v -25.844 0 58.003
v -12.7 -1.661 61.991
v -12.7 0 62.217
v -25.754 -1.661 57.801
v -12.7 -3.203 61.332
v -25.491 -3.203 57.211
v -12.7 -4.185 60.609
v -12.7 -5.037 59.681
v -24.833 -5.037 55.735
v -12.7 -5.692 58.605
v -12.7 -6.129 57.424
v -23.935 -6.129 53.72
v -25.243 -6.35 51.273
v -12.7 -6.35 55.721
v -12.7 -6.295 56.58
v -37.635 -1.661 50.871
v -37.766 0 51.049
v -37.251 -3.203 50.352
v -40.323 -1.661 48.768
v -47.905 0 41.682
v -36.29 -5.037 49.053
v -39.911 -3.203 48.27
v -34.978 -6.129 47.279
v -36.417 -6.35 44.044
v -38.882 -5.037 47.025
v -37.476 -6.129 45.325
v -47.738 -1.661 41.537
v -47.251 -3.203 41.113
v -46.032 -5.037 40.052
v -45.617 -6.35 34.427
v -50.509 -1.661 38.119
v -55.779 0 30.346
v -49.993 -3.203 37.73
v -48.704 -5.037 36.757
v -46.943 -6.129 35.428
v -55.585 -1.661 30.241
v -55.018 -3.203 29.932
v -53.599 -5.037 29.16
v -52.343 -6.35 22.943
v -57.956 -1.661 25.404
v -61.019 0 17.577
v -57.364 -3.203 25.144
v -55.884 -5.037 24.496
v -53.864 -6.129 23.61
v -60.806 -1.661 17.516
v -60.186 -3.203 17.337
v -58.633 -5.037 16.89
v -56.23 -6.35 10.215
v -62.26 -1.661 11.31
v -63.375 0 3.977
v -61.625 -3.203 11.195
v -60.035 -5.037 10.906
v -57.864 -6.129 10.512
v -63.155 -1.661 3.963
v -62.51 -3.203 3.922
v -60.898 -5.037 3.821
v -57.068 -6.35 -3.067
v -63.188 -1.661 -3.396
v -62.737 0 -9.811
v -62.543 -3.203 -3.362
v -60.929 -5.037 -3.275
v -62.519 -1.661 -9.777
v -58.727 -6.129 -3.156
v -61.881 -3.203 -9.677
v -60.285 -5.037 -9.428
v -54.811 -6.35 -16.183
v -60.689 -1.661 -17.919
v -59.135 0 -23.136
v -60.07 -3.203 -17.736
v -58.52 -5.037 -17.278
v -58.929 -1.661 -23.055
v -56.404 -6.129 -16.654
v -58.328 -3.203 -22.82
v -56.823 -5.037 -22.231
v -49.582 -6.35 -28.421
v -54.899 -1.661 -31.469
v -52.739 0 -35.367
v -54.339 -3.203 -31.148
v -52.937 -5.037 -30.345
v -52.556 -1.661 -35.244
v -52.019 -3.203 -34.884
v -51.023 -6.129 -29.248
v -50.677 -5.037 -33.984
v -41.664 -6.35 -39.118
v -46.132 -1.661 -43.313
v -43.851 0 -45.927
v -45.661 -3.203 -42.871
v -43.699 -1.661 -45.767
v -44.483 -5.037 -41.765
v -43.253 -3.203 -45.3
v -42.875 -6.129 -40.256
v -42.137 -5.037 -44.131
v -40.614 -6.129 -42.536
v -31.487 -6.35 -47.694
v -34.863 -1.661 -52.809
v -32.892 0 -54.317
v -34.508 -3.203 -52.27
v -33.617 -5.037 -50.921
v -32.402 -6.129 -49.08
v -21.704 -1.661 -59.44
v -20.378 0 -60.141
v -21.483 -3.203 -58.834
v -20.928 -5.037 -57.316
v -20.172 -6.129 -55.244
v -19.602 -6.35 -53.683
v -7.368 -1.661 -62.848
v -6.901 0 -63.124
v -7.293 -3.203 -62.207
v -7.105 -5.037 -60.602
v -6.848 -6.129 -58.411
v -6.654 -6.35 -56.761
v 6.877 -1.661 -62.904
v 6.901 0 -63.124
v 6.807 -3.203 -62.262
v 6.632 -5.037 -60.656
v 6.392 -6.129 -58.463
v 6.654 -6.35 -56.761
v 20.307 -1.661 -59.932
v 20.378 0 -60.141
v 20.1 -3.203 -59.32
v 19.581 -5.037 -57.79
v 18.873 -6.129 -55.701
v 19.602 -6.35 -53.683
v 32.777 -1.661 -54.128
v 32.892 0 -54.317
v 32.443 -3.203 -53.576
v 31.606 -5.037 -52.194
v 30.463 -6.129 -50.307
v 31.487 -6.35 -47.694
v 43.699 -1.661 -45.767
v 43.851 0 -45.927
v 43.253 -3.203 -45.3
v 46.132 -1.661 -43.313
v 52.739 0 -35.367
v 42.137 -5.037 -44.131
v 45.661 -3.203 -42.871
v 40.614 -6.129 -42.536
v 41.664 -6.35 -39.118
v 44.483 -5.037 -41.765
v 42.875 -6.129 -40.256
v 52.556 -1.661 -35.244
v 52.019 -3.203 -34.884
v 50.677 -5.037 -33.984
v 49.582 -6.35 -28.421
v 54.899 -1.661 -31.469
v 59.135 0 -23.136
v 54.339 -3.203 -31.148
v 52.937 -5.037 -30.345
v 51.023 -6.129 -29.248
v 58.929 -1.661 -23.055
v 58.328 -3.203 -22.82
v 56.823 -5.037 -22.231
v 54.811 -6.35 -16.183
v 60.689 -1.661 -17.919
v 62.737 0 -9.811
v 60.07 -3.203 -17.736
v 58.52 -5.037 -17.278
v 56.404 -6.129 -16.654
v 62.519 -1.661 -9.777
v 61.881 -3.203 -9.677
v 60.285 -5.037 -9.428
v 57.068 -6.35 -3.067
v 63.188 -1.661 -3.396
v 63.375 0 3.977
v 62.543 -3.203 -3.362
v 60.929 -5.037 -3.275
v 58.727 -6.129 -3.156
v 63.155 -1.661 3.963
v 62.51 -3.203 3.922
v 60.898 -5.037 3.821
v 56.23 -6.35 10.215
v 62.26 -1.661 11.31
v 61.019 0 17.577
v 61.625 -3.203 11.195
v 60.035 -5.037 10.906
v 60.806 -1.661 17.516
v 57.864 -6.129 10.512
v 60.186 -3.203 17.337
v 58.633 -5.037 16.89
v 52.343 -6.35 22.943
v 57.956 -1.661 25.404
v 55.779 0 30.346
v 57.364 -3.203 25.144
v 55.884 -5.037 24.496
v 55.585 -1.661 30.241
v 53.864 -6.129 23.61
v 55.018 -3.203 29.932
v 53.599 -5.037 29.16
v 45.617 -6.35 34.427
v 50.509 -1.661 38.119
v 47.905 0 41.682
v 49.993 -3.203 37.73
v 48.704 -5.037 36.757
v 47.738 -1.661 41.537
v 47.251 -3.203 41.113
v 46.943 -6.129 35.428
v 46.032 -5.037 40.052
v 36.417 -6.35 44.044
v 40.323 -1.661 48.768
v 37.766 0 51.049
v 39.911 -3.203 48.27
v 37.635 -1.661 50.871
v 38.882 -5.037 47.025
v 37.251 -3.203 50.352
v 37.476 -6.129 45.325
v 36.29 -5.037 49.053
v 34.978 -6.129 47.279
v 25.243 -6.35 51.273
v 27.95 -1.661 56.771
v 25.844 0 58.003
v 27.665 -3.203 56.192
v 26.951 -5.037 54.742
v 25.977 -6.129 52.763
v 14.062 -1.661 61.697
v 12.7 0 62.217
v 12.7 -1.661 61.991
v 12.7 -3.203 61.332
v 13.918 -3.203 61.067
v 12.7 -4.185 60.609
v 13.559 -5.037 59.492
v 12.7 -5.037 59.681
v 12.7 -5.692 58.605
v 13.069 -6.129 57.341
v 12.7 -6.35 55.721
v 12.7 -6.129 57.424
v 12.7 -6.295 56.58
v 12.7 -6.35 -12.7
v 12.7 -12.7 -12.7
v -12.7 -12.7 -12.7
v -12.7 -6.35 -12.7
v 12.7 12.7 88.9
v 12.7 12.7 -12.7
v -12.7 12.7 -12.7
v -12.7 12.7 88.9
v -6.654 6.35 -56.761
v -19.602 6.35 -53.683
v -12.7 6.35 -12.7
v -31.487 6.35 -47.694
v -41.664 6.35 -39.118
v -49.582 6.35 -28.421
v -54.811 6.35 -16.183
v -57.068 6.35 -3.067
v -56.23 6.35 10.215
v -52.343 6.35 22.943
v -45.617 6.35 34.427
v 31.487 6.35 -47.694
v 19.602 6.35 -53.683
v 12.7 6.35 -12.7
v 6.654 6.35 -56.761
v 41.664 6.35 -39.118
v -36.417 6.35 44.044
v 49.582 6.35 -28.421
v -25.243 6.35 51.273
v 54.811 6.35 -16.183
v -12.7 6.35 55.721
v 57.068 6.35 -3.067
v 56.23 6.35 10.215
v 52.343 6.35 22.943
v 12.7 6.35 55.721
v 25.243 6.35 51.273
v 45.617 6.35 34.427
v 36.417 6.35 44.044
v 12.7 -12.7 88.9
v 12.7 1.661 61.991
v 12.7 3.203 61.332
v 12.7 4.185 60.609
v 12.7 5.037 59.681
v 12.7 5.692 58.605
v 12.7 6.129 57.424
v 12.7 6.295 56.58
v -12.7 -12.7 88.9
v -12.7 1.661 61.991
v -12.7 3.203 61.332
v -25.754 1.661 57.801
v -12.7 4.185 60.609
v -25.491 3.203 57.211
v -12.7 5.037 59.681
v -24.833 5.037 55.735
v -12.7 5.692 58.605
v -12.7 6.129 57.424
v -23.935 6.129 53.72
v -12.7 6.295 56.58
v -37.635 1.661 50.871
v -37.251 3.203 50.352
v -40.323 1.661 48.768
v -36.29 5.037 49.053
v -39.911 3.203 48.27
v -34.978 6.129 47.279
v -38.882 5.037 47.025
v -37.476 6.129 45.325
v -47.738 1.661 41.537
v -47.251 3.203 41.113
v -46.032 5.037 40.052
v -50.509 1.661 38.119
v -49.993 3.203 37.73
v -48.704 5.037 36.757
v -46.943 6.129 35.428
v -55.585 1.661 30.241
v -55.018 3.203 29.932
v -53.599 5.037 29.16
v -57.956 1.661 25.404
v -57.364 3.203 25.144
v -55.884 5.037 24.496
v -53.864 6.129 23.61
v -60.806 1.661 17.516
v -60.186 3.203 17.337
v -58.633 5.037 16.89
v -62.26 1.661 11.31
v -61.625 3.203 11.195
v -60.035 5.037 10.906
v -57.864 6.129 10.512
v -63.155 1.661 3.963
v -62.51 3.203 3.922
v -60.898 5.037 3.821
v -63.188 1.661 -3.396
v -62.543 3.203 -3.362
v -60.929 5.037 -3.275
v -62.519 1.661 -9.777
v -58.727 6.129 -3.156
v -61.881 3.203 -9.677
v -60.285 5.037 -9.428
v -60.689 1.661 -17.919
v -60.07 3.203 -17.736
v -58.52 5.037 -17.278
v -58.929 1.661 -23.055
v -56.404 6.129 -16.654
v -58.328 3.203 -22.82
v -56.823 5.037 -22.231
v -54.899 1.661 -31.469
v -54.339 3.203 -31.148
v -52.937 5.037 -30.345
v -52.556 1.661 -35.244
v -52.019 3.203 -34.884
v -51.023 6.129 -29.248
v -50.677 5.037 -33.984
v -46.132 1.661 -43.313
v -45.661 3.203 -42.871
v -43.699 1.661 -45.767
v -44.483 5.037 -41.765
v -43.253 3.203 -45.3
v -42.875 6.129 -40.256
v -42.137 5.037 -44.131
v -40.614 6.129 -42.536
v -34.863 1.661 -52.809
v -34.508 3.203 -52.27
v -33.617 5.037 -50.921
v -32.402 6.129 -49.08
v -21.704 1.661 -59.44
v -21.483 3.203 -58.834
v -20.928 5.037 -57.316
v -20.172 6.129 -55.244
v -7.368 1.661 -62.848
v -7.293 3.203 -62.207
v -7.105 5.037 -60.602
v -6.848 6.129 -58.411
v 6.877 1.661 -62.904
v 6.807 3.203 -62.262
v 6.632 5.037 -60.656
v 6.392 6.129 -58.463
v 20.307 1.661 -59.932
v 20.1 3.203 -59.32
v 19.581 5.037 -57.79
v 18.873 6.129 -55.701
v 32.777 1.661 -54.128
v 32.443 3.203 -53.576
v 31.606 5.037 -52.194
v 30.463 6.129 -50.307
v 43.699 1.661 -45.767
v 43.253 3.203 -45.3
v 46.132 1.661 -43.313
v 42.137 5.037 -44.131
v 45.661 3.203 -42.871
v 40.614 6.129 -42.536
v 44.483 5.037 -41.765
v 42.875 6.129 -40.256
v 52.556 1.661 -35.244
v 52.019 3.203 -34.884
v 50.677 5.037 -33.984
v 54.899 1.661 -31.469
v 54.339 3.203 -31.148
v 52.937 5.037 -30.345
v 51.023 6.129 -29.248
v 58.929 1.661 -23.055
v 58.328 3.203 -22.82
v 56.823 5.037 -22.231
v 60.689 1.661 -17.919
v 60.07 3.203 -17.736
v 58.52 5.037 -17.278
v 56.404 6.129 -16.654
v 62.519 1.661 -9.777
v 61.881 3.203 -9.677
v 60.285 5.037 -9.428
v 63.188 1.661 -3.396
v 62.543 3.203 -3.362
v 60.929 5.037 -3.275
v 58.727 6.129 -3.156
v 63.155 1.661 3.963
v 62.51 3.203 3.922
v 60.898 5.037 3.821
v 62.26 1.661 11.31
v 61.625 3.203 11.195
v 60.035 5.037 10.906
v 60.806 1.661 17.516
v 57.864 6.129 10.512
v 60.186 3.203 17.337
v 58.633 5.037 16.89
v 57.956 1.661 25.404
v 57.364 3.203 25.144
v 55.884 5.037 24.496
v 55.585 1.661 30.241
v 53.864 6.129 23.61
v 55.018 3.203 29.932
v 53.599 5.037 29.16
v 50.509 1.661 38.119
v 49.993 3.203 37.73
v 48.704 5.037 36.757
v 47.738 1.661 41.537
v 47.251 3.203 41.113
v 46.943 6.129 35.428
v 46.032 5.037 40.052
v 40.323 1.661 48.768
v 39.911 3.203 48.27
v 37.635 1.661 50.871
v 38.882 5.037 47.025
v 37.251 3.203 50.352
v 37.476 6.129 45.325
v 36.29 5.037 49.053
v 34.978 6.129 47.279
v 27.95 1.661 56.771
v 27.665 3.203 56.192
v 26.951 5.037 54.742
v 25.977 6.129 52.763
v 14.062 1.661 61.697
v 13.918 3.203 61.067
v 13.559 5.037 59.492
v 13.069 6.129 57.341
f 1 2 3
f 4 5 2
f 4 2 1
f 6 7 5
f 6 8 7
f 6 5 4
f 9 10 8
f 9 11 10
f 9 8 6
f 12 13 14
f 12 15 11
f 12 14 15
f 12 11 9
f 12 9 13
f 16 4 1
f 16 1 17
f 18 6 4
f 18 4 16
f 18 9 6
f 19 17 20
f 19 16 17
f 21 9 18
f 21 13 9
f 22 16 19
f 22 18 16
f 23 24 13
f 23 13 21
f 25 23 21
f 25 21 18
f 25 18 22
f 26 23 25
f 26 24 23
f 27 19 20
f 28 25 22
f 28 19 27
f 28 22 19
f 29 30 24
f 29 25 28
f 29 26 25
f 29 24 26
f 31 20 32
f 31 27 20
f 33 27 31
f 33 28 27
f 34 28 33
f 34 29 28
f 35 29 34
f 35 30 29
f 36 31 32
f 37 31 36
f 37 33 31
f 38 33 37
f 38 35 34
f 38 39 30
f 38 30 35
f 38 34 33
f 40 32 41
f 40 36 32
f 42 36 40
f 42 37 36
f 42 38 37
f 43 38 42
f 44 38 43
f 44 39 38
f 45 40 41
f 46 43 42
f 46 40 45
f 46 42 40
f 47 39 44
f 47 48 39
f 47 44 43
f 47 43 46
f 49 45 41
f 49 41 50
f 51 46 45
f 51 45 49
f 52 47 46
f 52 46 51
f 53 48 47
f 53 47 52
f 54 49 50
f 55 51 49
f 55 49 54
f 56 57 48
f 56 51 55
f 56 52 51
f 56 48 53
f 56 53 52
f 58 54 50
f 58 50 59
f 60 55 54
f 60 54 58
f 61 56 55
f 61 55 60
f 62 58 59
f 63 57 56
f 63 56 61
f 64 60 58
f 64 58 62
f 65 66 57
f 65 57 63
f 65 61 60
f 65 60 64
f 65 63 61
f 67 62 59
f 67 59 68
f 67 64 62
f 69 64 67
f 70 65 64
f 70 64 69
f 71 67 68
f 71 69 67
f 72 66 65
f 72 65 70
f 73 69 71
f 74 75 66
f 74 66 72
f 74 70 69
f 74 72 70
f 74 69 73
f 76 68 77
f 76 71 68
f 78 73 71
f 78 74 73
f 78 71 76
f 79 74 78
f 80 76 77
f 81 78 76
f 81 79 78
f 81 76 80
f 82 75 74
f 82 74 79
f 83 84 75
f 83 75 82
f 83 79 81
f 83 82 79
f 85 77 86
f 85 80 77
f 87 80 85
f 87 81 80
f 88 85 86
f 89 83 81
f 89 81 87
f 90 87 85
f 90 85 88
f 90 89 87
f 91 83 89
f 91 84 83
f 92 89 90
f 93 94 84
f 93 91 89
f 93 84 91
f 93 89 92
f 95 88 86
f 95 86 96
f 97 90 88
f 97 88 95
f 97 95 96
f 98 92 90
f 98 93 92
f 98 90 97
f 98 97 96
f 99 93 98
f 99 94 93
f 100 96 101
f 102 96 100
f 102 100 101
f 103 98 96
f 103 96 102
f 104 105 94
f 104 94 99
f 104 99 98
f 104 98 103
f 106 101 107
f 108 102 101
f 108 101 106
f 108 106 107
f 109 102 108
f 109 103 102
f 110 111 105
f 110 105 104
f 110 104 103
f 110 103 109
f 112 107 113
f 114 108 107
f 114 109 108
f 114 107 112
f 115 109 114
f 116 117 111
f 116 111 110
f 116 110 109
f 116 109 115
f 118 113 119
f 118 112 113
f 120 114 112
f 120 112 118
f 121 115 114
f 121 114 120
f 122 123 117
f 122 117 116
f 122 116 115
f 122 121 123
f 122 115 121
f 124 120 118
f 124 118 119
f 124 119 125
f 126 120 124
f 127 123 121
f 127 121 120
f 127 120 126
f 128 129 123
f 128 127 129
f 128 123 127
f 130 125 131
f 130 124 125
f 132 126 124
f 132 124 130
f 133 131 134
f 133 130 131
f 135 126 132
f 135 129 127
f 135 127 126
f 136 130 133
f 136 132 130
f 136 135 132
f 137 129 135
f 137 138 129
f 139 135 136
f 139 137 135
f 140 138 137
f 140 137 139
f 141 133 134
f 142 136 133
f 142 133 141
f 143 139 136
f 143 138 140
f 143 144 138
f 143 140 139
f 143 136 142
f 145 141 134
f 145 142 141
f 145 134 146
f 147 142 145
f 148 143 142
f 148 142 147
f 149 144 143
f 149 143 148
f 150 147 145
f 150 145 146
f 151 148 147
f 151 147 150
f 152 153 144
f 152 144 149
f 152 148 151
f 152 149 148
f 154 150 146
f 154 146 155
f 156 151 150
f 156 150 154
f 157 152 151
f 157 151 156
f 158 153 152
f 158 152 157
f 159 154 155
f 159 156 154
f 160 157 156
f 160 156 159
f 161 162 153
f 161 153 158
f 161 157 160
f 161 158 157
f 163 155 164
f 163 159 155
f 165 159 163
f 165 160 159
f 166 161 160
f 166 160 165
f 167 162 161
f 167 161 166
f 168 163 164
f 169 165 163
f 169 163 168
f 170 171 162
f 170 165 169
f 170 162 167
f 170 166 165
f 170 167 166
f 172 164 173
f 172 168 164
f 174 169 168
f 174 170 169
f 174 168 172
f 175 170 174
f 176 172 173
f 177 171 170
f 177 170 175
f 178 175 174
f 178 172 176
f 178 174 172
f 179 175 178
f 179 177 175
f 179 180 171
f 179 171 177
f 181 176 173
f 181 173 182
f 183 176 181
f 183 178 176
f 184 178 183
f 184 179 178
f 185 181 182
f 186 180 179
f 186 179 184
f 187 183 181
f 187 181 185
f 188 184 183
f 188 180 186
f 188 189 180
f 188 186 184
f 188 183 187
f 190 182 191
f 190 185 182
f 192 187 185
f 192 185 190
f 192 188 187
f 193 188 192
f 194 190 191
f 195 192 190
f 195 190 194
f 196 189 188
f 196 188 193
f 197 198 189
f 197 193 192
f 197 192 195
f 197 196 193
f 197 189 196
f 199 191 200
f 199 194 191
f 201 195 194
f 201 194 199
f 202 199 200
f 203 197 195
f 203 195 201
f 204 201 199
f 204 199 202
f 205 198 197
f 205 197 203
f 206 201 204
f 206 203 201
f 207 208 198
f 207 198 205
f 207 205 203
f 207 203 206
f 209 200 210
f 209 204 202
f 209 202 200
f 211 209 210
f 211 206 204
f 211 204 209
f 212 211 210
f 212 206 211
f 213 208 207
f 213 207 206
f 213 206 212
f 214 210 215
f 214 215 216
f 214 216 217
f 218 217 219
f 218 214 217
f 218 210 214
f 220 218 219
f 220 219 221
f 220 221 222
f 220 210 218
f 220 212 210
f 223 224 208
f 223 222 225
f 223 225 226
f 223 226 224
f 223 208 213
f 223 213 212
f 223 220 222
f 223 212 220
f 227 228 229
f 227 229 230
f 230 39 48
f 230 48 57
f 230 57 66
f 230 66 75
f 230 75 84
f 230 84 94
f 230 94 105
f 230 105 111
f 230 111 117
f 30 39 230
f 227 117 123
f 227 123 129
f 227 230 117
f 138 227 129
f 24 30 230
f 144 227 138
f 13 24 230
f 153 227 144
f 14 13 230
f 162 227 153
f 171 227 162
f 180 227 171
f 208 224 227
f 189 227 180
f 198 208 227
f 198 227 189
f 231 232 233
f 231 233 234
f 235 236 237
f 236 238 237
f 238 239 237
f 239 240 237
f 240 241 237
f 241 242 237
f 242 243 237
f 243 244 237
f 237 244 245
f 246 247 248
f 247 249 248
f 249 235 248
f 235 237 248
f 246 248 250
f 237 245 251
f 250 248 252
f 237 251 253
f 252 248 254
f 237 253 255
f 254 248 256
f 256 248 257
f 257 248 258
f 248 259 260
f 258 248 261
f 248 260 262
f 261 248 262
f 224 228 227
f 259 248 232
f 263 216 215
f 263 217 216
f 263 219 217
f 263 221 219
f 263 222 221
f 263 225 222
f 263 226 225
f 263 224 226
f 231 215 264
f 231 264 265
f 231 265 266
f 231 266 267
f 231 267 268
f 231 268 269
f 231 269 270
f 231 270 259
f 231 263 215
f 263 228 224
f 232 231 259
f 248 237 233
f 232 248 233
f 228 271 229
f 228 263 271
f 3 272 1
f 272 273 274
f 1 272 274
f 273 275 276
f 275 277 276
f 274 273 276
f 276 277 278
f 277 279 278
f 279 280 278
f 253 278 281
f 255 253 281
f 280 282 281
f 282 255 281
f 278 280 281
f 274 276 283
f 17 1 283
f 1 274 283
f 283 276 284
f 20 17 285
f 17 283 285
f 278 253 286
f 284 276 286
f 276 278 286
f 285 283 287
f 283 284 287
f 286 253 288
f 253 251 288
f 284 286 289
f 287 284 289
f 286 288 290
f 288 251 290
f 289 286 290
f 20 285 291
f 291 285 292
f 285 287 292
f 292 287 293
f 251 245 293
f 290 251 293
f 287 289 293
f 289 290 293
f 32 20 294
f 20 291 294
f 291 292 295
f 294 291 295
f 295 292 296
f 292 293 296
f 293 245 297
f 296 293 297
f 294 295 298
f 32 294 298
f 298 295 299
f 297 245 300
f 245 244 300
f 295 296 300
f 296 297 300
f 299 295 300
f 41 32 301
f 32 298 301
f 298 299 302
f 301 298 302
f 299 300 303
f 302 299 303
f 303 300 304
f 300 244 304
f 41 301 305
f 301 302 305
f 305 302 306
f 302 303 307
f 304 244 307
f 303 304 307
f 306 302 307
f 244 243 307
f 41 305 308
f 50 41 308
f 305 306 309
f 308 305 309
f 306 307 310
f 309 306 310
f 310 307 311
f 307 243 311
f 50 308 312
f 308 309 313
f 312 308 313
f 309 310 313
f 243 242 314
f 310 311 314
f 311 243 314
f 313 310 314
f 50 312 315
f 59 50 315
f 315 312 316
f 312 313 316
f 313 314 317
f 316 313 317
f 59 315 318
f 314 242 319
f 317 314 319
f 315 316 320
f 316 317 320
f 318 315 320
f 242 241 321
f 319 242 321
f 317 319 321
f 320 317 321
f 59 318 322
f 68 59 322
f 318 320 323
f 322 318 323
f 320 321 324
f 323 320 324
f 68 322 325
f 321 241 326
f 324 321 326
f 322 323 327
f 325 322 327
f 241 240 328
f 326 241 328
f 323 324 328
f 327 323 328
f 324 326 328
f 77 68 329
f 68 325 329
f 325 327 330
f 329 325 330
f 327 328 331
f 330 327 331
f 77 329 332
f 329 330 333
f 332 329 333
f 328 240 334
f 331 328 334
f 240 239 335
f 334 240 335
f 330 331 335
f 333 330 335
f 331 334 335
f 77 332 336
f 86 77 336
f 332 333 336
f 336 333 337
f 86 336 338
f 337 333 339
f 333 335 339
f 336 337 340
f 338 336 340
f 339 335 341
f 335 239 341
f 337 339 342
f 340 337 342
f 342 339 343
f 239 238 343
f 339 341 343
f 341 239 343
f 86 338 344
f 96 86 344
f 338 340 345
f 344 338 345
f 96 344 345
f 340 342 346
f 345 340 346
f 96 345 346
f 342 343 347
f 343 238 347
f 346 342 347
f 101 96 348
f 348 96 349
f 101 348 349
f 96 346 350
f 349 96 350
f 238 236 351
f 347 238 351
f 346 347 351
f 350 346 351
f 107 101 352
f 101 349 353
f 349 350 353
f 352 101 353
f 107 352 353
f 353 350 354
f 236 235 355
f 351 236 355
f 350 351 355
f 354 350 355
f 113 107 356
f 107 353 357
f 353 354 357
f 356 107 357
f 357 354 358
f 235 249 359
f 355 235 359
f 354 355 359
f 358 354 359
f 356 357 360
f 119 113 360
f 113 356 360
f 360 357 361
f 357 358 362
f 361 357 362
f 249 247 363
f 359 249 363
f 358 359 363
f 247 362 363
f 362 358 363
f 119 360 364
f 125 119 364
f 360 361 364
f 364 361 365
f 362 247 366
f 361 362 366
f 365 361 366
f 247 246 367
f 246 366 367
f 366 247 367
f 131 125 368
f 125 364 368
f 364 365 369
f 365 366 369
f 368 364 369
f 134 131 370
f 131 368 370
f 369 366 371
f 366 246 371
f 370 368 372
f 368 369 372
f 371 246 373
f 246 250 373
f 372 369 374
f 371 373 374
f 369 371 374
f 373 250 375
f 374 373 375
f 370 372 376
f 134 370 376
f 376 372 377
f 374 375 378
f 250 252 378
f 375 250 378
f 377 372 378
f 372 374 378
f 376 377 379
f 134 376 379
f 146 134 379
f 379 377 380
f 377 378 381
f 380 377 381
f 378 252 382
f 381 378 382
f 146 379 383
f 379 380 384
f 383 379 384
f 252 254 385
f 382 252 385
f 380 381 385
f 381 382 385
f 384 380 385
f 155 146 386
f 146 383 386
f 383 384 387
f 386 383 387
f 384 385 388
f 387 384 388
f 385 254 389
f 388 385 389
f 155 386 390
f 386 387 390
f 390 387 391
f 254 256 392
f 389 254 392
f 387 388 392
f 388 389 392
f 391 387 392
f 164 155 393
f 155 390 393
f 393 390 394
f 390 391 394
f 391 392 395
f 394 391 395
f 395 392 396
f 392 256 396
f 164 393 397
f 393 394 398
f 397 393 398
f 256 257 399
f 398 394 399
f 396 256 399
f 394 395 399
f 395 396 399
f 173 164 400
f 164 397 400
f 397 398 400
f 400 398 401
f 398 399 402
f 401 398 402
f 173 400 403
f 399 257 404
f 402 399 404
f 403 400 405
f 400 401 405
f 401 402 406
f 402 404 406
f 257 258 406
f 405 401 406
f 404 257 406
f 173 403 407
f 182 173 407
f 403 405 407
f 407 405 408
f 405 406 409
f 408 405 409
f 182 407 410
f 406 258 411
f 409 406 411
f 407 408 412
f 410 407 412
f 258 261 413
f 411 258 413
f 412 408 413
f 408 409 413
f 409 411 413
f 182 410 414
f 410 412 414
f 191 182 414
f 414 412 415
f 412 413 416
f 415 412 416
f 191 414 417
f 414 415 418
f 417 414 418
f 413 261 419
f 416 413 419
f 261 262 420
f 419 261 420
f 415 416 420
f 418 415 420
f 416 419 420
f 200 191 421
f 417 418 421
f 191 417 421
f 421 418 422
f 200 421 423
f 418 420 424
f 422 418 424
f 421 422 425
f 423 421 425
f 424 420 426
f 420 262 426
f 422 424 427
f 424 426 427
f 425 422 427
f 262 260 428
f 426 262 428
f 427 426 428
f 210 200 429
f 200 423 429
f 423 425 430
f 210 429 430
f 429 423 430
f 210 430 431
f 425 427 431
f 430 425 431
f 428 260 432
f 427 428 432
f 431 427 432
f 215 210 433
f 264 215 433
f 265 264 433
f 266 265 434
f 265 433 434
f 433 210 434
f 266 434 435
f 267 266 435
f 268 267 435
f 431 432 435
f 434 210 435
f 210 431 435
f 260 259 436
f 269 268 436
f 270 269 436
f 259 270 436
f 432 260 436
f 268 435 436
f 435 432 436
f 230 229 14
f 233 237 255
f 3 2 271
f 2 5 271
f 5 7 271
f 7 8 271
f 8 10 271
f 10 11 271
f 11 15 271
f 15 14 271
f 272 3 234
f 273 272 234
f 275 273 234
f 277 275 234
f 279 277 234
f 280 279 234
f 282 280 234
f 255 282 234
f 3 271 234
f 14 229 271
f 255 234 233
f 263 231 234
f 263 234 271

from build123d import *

# Parameters (mm, degrees)
F0_R     = 63.5
F0_R_2   = 6.35
F1_DEPTH = 6.35
F2_R     = 6.34999
F4_DEPTH = 12.7


# Not quite as in the source:
# - a fillet or chamfer is up to 0.001 mm smaller than in the source, because OpenCascade refuses the exact size


with BuildPart() as f1:
    # F0 (on Front) → F1 (new body, symmetric)
    with BuildSketch(Plane.XZ):
        Circle(F0_R)
        Circle(F0_R_2, mode=Mode.SUBTRACT)
    extrude(amount=F1_DEPTH, both=True)

    # F2 (radius 6.35 in the source; OpenCascade refuses exactly that, so slightly less here)
    f2_edges = [f1.edges().sort_by_distance(p)[0] for p in [
        (-63.5, -6.35, 0),
        (-63.5, 6.35, 0),
    ]]
    fillet(f2_edges, radius=F2_R)

    # F3 (on Right) → F4 (join, symmetric)
    with BuildSketch(Plane.YZ):
        Polygon((-12.7, -12.7), (0, -12.7), (12.7, -12.7), (12.7, 88.9), (-12.7, 88.9), align=None)
    extrude(amount=F4_DEPTH, both=True)


solid = f1.part
